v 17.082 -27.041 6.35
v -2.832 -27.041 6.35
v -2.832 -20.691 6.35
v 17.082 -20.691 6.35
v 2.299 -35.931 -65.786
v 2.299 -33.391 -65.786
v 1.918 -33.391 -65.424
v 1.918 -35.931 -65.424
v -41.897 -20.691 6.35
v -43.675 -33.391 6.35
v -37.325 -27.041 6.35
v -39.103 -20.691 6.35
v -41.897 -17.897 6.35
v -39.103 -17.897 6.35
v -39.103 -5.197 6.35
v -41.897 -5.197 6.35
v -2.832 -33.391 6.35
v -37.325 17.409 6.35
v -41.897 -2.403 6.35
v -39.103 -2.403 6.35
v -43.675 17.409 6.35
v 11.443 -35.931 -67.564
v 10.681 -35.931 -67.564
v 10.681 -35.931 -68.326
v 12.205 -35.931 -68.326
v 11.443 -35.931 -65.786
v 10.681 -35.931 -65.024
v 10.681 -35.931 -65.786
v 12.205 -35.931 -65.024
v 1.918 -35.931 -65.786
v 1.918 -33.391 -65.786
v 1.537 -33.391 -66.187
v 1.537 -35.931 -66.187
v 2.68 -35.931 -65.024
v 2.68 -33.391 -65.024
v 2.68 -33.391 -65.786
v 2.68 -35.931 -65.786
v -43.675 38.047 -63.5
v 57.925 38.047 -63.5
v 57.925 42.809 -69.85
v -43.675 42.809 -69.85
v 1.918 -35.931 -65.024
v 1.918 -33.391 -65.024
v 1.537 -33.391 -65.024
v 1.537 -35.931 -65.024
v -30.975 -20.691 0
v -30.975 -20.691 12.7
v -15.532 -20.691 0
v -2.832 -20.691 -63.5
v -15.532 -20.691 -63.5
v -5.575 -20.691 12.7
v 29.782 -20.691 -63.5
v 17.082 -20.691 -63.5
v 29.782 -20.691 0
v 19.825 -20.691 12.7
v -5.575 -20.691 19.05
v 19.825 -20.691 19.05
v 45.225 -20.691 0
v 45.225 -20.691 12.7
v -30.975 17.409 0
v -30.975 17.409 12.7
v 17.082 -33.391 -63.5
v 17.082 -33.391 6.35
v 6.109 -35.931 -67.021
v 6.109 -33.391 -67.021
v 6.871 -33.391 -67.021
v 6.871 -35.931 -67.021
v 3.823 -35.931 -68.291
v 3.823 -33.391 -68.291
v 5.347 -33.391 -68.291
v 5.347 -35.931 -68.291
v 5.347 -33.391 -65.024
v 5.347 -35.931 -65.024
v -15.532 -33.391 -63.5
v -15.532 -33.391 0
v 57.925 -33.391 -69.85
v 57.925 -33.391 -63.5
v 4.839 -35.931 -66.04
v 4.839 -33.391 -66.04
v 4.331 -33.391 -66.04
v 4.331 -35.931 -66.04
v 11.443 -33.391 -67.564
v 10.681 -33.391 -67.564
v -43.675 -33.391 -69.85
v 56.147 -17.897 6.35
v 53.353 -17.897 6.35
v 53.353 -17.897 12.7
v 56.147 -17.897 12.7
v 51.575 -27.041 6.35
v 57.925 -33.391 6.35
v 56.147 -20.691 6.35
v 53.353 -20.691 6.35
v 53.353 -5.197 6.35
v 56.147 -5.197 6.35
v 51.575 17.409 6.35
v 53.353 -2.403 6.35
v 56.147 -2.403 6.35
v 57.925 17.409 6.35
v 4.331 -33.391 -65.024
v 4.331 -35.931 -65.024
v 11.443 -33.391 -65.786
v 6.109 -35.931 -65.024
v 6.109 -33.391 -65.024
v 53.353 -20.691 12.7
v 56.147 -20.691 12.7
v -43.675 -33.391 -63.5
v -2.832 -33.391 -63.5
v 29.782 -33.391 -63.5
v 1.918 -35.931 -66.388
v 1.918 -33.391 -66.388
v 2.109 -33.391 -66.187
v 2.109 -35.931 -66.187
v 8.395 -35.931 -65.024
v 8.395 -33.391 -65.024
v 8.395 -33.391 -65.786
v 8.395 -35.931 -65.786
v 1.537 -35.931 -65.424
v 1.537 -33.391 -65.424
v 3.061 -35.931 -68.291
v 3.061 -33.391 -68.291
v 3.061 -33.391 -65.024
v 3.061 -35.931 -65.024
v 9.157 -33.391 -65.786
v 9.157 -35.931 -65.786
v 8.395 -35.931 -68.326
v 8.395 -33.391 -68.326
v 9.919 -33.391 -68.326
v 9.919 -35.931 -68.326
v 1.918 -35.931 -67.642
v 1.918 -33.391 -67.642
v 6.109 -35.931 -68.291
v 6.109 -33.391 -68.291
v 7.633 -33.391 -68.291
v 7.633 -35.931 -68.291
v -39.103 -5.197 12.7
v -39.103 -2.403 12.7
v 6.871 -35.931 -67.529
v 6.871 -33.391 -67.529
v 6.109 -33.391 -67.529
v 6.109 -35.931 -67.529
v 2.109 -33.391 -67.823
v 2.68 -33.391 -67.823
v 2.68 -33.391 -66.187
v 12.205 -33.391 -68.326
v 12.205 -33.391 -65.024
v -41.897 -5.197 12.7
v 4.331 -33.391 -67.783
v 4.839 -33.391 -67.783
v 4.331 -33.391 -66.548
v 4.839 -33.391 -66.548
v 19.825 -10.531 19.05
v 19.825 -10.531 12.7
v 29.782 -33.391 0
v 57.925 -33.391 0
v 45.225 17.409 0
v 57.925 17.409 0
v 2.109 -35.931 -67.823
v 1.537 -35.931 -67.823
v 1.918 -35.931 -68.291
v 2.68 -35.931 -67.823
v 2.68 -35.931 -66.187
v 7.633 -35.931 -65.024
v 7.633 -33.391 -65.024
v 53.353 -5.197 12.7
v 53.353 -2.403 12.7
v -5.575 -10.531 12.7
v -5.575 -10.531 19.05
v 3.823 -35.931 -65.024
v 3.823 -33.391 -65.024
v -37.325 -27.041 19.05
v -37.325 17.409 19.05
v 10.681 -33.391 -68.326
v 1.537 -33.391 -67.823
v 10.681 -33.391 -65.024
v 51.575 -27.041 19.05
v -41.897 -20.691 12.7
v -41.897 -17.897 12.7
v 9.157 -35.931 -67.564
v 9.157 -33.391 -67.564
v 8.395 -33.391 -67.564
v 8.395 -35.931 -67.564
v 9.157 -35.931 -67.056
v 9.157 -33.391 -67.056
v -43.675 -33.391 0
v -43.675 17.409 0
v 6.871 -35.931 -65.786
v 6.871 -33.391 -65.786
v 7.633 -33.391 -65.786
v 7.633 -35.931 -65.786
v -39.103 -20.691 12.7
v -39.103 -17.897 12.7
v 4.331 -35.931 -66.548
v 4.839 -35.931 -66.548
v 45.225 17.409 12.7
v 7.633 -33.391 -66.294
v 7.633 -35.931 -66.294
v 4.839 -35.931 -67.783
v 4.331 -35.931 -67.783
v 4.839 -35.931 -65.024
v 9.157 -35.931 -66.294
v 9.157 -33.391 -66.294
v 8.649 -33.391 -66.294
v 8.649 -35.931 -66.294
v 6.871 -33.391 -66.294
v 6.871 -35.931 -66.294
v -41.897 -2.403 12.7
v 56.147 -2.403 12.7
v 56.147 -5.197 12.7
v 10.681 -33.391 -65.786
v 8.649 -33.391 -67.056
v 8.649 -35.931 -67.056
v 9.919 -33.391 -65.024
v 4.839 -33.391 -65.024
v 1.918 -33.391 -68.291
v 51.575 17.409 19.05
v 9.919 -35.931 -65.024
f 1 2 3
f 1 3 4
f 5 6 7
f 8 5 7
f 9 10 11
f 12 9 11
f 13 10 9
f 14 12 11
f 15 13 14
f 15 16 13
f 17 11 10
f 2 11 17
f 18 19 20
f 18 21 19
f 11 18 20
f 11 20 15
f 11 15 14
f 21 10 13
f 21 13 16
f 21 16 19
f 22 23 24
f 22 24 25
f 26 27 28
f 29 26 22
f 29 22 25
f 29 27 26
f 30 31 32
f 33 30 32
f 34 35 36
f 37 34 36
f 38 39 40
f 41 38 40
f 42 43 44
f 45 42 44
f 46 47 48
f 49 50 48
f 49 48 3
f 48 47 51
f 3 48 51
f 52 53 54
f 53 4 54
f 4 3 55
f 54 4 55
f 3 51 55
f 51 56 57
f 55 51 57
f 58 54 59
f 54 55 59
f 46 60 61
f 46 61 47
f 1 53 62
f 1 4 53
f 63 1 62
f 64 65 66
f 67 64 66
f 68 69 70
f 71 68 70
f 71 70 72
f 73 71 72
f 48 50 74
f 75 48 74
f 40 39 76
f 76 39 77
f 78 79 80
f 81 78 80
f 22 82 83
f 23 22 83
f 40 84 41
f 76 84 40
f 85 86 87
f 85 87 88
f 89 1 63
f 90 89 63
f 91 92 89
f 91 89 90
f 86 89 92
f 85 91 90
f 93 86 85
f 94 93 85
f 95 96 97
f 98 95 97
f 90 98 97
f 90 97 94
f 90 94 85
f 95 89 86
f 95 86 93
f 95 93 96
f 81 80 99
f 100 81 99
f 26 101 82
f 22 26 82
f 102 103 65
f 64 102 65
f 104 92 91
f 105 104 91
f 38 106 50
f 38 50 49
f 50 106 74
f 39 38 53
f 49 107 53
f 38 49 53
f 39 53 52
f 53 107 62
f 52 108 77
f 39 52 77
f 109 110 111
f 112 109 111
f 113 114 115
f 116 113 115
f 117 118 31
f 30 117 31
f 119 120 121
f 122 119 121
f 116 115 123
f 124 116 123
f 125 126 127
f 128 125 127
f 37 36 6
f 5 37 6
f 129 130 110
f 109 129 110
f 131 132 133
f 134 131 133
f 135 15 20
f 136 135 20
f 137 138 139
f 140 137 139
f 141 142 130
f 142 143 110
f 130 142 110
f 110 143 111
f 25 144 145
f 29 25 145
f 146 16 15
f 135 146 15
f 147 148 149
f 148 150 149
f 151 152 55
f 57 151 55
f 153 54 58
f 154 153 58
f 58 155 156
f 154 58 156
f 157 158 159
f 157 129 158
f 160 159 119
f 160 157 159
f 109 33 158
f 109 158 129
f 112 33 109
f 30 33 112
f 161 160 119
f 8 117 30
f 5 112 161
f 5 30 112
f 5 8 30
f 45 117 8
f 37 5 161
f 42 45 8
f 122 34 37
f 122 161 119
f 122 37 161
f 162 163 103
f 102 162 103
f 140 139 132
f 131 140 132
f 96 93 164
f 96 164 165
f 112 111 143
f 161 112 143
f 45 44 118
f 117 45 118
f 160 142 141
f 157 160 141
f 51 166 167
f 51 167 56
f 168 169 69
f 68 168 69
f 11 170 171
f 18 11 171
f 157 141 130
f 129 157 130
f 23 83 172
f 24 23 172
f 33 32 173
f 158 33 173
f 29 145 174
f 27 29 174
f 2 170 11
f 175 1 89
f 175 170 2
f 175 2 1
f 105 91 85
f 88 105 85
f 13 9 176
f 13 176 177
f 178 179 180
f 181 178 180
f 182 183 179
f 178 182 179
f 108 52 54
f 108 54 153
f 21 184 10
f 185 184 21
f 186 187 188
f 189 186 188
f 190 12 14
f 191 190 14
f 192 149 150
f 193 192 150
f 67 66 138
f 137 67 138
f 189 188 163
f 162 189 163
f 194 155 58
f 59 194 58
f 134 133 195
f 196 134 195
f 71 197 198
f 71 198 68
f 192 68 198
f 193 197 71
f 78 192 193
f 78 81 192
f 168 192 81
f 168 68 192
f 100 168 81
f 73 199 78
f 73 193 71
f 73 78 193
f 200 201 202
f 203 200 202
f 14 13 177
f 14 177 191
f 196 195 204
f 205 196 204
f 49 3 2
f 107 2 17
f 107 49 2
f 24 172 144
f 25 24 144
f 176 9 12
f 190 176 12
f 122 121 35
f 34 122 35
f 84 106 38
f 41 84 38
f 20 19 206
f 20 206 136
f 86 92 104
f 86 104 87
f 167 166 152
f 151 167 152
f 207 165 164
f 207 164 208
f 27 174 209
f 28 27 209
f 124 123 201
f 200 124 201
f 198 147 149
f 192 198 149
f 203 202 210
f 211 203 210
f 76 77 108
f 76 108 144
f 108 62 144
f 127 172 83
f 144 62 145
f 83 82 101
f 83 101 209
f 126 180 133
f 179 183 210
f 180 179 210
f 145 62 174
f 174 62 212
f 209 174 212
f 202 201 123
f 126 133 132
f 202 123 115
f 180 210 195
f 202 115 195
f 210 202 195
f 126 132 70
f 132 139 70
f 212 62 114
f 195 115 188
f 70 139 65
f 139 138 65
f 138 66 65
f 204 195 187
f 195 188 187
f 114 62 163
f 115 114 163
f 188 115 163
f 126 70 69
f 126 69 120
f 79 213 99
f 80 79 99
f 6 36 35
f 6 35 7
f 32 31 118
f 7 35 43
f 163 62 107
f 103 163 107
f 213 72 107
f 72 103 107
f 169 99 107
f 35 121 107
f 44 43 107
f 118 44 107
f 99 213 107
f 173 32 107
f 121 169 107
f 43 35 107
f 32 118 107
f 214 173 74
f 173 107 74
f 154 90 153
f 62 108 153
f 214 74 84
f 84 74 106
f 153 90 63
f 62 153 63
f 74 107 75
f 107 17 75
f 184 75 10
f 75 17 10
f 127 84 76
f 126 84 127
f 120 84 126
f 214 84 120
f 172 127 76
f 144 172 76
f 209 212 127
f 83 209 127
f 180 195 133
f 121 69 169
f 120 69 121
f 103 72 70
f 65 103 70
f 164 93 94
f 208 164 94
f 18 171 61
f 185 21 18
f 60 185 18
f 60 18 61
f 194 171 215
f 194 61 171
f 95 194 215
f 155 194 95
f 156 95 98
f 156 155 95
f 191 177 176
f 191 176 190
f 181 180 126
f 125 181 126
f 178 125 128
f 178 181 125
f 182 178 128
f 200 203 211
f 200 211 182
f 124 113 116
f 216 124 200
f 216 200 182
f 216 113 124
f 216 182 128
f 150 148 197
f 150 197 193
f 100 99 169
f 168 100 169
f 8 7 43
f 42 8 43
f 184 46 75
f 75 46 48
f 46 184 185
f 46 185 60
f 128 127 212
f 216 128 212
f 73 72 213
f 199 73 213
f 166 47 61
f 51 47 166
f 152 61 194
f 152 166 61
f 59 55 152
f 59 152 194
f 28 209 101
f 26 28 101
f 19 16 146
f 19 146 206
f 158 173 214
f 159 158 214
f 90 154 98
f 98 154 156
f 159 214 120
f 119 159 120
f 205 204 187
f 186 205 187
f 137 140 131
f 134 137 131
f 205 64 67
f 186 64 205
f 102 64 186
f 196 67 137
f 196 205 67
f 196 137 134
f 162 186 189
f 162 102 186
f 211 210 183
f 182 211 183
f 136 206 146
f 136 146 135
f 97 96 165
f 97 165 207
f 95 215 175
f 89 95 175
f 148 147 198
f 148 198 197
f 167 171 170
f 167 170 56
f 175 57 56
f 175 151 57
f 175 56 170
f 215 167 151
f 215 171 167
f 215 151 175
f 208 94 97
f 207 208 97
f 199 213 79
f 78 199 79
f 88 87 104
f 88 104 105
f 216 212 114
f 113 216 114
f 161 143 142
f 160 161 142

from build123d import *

# Parameters (mm, degrees)
F0_W      = 101.6
F0_H      = 50.8
F1_DEPTH  = 19.05
F2_W      = 88.9
F2_H      = 6.35
F3_DEPTH  = 12.7
F4_W      = 76.2
F4_H      = 38.1
F5_DEPTH  = 12.7
F6_W      = 25.4
F6_H      = 10.16
F7_DEPTH  = 25.4
F8_W      = 19.9136
F8_H      = 12.7
F9_DEPTH  = 6.35
F10_W     = 12.7
F10_H     = 12.7
F11_DEPTH = 63.5
F12_W     = 12.7
F12_H     = 12.7
F13_DEPTH = 6.35
F15_DEPTH = 101.6
F16_W     = 2.794
F16_H     = 2.794
F17_DEPTH = 6.35
F18_W     = 0.508
F18_H     = 1.235321
F19_DEPTH = 2.54


with BuildPart() as f1:
    # F0 (on Top) → F1 (new body)
    with BuildSketch(Plane.XY):
        with Locations((7.125289, -7.990768)):
            Rectangle(F0_W, F0_H)
    extrude(amount=F1_DEPTH)

    # F2 (on face) → F3 (cut)
    with BuildSketch(Plane.XY.offset(19.05)):
        Polygon((-37.324711, -27.040768), (-37.324711, 17.409232), (-43.674711, 17.409232), (-43.674711, -33.390768), (-37.324711, -33.390768), align=None)
        with Locations((7.125289, -30.215768)):
            Rectangle(F2_W, F2_H)
        Polygon((57.925289, 17.409232), (51.575289, 17.409232), (51.575289, -27.040768), (51.575289, -33.390768), (57.925289, -33.390768), align=None)
    extrude(amount=-F3_DEPTH, mode=Mode.SUBTRACT)

    # F4 (on face) → F5 (cut)
    with BuildSketch(Plane(origin=(0, 0, 0), x_dir=(1, 0, 0), z_dir=(0, 0, -1))):
        with Locations((7.125289, 1.640768)):
            Rectangle(F4_W, F4_H)
    extrude(amount=-F5_DEPTH, mode=Mode.SUBTRACT)

    # F6 (on face) → F7 (cut)
    with BuildSketch(Plane(origin=(0, 0, 12.7), x_dir=(1, 0, 0), z_dir=(0, 0, -1))):
        with Locations((7.125289, 15.610768)):
            Rectangle(F6_W, F6_H)
    extrude(amount=-F7_DEPTH, mode=Mode.SUBTRACT)

    # F8 (on face) → F9 (cut)
    with BuildSketch(Plane(origin=(0, 0, 0), x_dir=(1, 0, 0), z_dir=(0, 0, -1))):
        with Locations((7.125289, 27.040768)):
            Rectangle(F8_W, F8_H)
    extrude(amount=-F9_DEPTH, mode=Mode.SUBTRACT)

    # F10 (on face) → F11 (join)
    with BuildSketch(Plane(origin=(0, 0, 0), x_dir=(1, 0, 0), z_dir=(0, 0, -1))):
        with Locations((23.432089, 27.040768)):
            Rectangle(F10_W, F10_H)
        with Locations((-9.181511, 27.040768)):
            Rectangle(F10_W, F10_H)
    extrude(amount=F11_DEPTH)

    # F12 (on face) → F13 (join)
    with BuildSketch(Plane(origin=(0, 0, -63.5), x_dir=(1, 0, 0), z_dir=(0, 0, -1))):
        Polygon((-43.674711, 33.390768), (-43.674711, -42.809232), (57.925289, -42.809232), (57.925289, 33.390768), (-2.831511, 33.390768), (-2.831511, 20.690768), (-15.531511, 20.690768), (-15.531511, 33.390768), align=None)
        with Locations((-9.181511, 27.040768)):
            Rectangle(F12_W, F12_H)
    extrude(amount=F13_DEPTH)

    # F14 (on face) → F15 (cut)
    with BuildSketch(Plane.YZ.offset(57.925289)):
        Polygon((38.046732, -63.5), (42.809232, -69.85), (42.809232, -63.5), align=None)
    extrude(amount=-F15_DEPTH, mode=Mode.SUBTRACT)

    # F16 (on face) → F17 (join)
    with BuildSketch(Plane.XY.offset(6.35)):
        with Locations((-40.499711, -3.799768)):
            Rectangle(F16_W, F16_H)
        with Locations((-40.499711, -19.293768)):
            Rectangle(F16_W, F16_H)
        with Locations((54.750289, -3.799768)):
            Rectangle(F16_W, F16_H)
        with Locations((54.750289, -19.293768)):
            Rectangle(F16_W, F16_H)
    extrude(amount=F17_DEPTH)

    # F18 (on face) → F19 (join)
    with BuildSketch(Plane.XZ.offset(33.390768)):
        Polygon((10.681289, -67.564), (10.681289, -68.326), (12.205289, -68.326), (12.205289, -65.024), (10.681289, -65.024), (10.681289, -65.786), (11.443289, -65.786), (11.443289, -67.564), align=None)
        Polygon((8.395289, -68.326), (9.919289, -68.326), (9.919289, -65.024), (8.395289, -65.024), (8.395289, -65.786), (9.157289, -65.786), (9.157289, -66.294), (8.649289, -66.294), (8.649289, -67.056), (9.157289, -67.056), (9.157289, -67.564), (8.395289, -67.564), align=None)
        Polygon((6.109289, -67.529321), (6.109289, -68.291321), (7.633289, -68.291321), (7.633289, -66.294), (6.871289, -66.294), (6.871289, -65.786), (7.633289, -65.786), (7.633289, -65.024), (6.109289, -65.024), (6.109289, -67.021321), (6.871289, -67.021321), (6.871289, -67.529321), align=None)
        Polygon((3.823289, -68.291321), (5.347289, -68.291321), (5.347289, -65.024), (4.839289, -65.024), (4.839289, -66.04), (4.331289, -66.04), (4.331289, -65.024), (3.823289, -65.024), align=None)
        with Locations((4.585289, -67.165661)):
            Rectangle(F18_W, F18_H, mode=Mode.SUBTRACT)
        Polygon((2.299289, -68.291321), (3.061289, -68.291321), (3.061289, -65.024), (2.680289, -65.024), (2.680289, -65.786), (2.299289, -65.786), (1.918289, -65.42404), (1.918289, -65.024), (1.537289, -65.024), (1.537289, -65.42404), (1.918289, -65.786), (1.537289, -66.187042), (1.537289, -67.823172), (1.918289, -68.291321), align=None)
        Polygon((2.108789, -66.187042), (2.680289, -66.187042), (2.680289, -67.823172), (2.108789, -67.823172), (1.918289, -67.642192), (1.918289, -66.387562), align=None, mode=Mode.SUBTRACT)
    extrude(amount=F19_DEPTH)


solid = f1.part
